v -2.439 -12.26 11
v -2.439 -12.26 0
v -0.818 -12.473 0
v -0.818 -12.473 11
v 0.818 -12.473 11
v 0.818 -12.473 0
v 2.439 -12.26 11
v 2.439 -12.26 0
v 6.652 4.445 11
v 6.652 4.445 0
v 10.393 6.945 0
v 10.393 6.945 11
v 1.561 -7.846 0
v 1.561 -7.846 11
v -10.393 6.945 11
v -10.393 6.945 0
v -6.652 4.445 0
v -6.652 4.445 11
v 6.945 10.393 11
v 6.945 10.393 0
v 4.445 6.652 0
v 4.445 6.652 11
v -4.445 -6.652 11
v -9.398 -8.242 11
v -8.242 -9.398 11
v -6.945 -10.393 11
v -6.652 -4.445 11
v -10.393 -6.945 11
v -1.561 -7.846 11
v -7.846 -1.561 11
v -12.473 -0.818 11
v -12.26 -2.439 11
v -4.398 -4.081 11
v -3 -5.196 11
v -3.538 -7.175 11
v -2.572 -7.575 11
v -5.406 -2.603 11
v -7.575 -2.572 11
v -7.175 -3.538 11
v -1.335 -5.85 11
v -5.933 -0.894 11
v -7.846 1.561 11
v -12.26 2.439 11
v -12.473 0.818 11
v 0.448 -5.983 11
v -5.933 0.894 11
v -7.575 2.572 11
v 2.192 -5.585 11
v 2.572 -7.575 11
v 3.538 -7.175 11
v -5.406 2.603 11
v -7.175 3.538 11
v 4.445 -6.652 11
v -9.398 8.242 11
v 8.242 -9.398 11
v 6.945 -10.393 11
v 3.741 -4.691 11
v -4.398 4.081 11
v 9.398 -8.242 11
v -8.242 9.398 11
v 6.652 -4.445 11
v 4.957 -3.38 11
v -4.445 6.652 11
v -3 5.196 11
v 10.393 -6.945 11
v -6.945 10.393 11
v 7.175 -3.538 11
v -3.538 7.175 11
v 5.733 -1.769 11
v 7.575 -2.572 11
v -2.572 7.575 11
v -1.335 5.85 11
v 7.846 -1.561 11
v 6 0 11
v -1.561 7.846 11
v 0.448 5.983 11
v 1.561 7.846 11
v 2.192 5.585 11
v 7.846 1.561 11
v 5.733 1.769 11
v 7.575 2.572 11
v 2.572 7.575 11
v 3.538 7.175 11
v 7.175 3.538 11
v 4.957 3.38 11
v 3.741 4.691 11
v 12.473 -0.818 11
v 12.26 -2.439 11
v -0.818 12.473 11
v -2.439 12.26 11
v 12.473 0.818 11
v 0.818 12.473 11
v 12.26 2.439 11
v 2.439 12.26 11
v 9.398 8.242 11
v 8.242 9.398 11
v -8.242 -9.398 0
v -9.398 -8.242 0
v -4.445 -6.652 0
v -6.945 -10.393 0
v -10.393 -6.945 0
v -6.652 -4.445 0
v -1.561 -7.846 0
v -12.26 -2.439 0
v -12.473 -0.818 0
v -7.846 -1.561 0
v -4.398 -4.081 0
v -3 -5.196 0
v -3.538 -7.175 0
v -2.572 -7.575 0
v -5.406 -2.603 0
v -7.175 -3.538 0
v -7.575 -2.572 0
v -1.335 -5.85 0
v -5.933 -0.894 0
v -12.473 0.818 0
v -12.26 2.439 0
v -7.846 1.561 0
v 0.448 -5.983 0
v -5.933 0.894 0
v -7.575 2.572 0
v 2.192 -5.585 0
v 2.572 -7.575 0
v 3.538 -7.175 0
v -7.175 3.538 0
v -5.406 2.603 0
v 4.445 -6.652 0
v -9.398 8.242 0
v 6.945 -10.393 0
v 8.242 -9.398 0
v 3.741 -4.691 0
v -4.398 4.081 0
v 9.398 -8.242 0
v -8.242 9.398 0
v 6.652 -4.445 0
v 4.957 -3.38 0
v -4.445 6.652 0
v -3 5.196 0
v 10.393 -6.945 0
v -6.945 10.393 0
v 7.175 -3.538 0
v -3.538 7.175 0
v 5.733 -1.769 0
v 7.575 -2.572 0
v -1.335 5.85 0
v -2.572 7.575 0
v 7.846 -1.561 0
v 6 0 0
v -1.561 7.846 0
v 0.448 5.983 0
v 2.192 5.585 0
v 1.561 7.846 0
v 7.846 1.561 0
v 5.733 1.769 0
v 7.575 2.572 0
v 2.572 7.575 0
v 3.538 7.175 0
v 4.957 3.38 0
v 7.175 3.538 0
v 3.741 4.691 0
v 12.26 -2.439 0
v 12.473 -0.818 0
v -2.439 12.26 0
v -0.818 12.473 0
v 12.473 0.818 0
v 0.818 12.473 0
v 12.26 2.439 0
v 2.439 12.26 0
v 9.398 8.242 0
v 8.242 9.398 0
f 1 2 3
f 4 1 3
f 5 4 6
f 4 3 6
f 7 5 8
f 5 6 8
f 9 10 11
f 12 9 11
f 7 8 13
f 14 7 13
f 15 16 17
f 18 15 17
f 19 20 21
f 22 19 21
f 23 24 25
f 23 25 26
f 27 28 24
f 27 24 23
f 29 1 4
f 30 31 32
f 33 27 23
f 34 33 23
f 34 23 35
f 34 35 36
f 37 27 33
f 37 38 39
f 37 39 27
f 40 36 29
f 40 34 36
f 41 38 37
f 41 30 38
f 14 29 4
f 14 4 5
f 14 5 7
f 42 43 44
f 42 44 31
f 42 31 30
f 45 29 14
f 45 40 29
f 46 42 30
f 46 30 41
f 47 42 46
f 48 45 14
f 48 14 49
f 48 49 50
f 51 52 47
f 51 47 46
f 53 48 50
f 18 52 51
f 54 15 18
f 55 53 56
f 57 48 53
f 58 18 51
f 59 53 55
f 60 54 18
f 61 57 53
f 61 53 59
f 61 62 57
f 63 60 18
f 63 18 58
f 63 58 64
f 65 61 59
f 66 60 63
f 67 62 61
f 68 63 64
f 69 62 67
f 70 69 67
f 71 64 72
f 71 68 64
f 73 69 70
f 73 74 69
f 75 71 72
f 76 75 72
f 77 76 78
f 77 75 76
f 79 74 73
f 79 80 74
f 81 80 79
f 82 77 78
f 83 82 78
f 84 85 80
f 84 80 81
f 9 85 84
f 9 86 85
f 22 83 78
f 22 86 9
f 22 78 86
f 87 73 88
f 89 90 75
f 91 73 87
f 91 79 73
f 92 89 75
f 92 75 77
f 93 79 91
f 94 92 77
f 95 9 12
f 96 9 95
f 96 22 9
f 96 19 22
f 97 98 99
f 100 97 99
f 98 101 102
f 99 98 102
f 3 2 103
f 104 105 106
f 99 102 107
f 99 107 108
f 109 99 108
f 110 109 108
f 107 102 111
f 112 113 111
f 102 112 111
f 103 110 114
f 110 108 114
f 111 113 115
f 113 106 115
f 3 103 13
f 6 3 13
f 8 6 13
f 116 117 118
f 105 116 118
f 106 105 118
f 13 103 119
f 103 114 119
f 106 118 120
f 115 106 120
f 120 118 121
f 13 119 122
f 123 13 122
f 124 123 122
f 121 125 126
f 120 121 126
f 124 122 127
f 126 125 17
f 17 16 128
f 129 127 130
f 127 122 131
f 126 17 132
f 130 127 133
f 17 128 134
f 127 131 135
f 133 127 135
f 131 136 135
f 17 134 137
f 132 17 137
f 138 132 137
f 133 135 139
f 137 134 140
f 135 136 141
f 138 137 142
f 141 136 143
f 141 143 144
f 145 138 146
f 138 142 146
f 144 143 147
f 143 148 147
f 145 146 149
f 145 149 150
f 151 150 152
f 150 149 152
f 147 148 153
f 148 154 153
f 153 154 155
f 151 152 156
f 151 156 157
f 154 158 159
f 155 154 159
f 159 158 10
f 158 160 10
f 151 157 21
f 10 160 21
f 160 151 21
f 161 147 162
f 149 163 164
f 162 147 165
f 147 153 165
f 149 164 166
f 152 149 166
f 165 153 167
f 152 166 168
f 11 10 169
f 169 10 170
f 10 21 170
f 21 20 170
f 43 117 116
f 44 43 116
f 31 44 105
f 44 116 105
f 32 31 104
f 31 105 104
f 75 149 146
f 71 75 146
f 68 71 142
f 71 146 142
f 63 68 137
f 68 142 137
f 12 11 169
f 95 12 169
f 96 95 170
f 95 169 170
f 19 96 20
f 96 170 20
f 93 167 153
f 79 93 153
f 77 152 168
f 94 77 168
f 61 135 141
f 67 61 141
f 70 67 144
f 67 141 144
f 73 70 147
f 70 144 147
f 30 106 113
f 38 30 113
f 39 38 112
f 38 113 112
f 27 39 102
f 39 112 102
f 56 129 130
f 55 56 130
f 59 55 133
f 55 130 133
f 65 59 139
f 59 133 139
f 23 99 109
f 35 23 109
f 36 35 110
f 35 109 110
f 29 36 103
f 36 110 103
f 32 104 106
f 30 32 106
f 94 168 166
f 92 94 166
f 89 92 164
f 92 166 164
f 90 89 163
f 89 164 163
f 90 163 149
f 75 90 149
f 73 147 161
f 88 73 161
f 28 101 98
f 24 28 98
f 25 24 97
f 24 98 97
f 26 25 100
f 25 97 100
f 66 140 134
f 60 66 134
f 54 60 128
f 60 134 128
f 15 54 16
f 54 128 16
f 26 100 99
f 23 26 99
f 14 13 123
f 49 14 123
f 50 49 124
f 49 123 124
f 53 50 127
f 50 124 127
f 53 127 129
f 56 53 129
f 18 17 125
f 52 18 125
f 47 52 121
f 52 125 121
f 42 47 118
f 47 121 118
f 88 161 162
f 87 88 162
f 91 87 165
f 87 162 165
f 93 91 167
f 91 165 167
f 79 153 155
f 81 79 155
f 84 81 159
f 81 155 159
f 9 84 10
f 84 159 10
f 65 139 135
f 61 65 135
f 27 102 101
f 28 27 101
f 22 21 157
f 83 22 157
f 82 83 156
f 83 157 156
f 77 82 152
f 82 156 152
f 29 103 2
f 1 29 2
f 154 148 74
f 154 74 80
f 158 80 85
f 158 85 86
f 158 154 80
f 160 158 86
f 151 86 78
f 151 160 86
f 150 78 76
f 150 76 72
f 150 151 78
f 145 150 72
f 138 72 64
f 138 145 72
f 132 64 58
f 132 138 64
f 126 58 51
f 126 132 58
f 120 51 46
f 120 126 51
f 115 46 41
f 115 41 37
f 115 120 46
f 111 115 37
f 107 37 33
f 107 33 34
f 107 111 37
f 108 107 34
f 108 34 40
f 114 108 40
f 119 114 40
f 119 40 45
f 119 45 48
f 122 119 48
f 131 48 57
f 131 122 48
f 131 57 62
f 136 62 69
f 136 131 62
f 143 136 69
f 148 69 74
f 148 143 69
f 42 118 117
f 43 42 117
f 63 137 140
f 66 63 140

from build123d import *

# Parameters (mm, degrees)
SKETCH_1_R      = 6
EXTRUDE_1_DEPTH = 11


with BuildPart() as part:
    # 草图1 → 凸台-拉伸1 (new body)
    with BuildSketch(Plane.XY):
        with BuildLine():
            Line((-2.438629025, 12.259816005), (-1.560722576, 7.846282243))
            ThreePointArc((-1.560722576, 7.846282243), (-3.061467459, 7.39103626), (-4.444561864, 6.651756898))
            Line((-4.444561864, 6.651756898), (-6.944627913, 10.393370154))
            ThreePointArc((-6.944627913, 10.393370154), (-8.838834765, 8.838834765), (-10.393370154, 6.944627913))
            Line((-10.393370154, 6.944627913), (-6.651756898, 4.444561864))
            ThreePointArc((-6.651756898, 4.444561864), (-7.39103626, 3.061467459), (-7.846282243, 1.560722576))
            Line((-7.846282243, 1.560722576), (-12.259816005, 2.438629025))
            ThreePointArc((-12.259816005, 2.438629025), (-12.5, 0), (-12.259816005, -2.438629025))
            Line((-12.259816005, -2.438629025), (-7.846282243, -1.560722576))
            ThreePointArc((-7.846282243, -1.560722576), (-7.39103626, -3.061467459), (-6.651756898, -4.444561864))
            Line((-6.651756898, -4.444561864), (-10.393370154, -6.944627913))
            ThreePointArc((-10.393370154, -6.944627913), (-8.838834765, -8.838834765), (-6.944627913, -10.393370154))
            Line((-6.944627913, -10.393370154), (-4.444561864, -6.651756898))
            ThreePointArc((-4.444561864, -6.651756898), (-3.061467459, -7.39103626), (-1.560722576, -7.846282243))
            Line((-1.560722576, -7.846282243), (-2.438629025, -12.259816005))
            ThreePointArc((-2.438629025, -12.259816005), (0, -12.5), (2.438629025, -12.259816005))
            Line((2.438629025, -12.259816005), (1.560722576, -7.846282243))
            ThreePointArc((1.560722576, -7.846282243), (3.061467459, -7.39103626), (4.444561864, -6.651756898))
            Line((4.444561864, -6.651756898), (6.944627913, -10.393370154))
            ThreePointArc((6.944627913, -10.393370154), (8.838834765, -8.838834765), (10.393370154, -6.944627913))
            Line((10.393370154, -6.944627913), (6.651756898, -4.444561864))
            ThreePointArc((6.651756898, -4.444561864), (7.39103626, -3.061467459), (7.846282243, -1.560722576))
            Line((7.846282243, -1.560722576), (12.259816005, -2.438629025))
            ThreePointArc((12.259816005, -2.438629025), (12.5, 0), (12.259816005, 2.438629025))
            Line((12.259816005, 2.438629025), (7.846282243, 1.560722576))
            ThreePointArc((7.846282243, 1.560722576), (7.39103626, 3.061467459), (6.651756898, 4.444561864))
            Line((6.651756898, 4.444561864), (10.393370154, 6.944627913))
            ThreePointArc((10.393370154, 6.944627913), (8.838834765, 8.838834765), (6.944627913, 10.393370154))
            Line((6.944627913, 10.393370154), (4.444561864, 6.651756898))
            ThreePointArc((4.444561864, 6.651756898), (3.061467459, 7.39103626), (1.560722576, 7.846282243))
            Line((1.560722576, 7.846282243), (2.438629025, 12.259816005))
            ThreePointArc((2.438629025, 12.259816005), (0, 12.5), (-2.438629025, 12.259816005))
        make_face()
        Circle(SKETCH_1_R, mode=Mode.SUBTRACT)
    extrude(amount=EXTRUDE_1_DEPTH)


solid = part.part
